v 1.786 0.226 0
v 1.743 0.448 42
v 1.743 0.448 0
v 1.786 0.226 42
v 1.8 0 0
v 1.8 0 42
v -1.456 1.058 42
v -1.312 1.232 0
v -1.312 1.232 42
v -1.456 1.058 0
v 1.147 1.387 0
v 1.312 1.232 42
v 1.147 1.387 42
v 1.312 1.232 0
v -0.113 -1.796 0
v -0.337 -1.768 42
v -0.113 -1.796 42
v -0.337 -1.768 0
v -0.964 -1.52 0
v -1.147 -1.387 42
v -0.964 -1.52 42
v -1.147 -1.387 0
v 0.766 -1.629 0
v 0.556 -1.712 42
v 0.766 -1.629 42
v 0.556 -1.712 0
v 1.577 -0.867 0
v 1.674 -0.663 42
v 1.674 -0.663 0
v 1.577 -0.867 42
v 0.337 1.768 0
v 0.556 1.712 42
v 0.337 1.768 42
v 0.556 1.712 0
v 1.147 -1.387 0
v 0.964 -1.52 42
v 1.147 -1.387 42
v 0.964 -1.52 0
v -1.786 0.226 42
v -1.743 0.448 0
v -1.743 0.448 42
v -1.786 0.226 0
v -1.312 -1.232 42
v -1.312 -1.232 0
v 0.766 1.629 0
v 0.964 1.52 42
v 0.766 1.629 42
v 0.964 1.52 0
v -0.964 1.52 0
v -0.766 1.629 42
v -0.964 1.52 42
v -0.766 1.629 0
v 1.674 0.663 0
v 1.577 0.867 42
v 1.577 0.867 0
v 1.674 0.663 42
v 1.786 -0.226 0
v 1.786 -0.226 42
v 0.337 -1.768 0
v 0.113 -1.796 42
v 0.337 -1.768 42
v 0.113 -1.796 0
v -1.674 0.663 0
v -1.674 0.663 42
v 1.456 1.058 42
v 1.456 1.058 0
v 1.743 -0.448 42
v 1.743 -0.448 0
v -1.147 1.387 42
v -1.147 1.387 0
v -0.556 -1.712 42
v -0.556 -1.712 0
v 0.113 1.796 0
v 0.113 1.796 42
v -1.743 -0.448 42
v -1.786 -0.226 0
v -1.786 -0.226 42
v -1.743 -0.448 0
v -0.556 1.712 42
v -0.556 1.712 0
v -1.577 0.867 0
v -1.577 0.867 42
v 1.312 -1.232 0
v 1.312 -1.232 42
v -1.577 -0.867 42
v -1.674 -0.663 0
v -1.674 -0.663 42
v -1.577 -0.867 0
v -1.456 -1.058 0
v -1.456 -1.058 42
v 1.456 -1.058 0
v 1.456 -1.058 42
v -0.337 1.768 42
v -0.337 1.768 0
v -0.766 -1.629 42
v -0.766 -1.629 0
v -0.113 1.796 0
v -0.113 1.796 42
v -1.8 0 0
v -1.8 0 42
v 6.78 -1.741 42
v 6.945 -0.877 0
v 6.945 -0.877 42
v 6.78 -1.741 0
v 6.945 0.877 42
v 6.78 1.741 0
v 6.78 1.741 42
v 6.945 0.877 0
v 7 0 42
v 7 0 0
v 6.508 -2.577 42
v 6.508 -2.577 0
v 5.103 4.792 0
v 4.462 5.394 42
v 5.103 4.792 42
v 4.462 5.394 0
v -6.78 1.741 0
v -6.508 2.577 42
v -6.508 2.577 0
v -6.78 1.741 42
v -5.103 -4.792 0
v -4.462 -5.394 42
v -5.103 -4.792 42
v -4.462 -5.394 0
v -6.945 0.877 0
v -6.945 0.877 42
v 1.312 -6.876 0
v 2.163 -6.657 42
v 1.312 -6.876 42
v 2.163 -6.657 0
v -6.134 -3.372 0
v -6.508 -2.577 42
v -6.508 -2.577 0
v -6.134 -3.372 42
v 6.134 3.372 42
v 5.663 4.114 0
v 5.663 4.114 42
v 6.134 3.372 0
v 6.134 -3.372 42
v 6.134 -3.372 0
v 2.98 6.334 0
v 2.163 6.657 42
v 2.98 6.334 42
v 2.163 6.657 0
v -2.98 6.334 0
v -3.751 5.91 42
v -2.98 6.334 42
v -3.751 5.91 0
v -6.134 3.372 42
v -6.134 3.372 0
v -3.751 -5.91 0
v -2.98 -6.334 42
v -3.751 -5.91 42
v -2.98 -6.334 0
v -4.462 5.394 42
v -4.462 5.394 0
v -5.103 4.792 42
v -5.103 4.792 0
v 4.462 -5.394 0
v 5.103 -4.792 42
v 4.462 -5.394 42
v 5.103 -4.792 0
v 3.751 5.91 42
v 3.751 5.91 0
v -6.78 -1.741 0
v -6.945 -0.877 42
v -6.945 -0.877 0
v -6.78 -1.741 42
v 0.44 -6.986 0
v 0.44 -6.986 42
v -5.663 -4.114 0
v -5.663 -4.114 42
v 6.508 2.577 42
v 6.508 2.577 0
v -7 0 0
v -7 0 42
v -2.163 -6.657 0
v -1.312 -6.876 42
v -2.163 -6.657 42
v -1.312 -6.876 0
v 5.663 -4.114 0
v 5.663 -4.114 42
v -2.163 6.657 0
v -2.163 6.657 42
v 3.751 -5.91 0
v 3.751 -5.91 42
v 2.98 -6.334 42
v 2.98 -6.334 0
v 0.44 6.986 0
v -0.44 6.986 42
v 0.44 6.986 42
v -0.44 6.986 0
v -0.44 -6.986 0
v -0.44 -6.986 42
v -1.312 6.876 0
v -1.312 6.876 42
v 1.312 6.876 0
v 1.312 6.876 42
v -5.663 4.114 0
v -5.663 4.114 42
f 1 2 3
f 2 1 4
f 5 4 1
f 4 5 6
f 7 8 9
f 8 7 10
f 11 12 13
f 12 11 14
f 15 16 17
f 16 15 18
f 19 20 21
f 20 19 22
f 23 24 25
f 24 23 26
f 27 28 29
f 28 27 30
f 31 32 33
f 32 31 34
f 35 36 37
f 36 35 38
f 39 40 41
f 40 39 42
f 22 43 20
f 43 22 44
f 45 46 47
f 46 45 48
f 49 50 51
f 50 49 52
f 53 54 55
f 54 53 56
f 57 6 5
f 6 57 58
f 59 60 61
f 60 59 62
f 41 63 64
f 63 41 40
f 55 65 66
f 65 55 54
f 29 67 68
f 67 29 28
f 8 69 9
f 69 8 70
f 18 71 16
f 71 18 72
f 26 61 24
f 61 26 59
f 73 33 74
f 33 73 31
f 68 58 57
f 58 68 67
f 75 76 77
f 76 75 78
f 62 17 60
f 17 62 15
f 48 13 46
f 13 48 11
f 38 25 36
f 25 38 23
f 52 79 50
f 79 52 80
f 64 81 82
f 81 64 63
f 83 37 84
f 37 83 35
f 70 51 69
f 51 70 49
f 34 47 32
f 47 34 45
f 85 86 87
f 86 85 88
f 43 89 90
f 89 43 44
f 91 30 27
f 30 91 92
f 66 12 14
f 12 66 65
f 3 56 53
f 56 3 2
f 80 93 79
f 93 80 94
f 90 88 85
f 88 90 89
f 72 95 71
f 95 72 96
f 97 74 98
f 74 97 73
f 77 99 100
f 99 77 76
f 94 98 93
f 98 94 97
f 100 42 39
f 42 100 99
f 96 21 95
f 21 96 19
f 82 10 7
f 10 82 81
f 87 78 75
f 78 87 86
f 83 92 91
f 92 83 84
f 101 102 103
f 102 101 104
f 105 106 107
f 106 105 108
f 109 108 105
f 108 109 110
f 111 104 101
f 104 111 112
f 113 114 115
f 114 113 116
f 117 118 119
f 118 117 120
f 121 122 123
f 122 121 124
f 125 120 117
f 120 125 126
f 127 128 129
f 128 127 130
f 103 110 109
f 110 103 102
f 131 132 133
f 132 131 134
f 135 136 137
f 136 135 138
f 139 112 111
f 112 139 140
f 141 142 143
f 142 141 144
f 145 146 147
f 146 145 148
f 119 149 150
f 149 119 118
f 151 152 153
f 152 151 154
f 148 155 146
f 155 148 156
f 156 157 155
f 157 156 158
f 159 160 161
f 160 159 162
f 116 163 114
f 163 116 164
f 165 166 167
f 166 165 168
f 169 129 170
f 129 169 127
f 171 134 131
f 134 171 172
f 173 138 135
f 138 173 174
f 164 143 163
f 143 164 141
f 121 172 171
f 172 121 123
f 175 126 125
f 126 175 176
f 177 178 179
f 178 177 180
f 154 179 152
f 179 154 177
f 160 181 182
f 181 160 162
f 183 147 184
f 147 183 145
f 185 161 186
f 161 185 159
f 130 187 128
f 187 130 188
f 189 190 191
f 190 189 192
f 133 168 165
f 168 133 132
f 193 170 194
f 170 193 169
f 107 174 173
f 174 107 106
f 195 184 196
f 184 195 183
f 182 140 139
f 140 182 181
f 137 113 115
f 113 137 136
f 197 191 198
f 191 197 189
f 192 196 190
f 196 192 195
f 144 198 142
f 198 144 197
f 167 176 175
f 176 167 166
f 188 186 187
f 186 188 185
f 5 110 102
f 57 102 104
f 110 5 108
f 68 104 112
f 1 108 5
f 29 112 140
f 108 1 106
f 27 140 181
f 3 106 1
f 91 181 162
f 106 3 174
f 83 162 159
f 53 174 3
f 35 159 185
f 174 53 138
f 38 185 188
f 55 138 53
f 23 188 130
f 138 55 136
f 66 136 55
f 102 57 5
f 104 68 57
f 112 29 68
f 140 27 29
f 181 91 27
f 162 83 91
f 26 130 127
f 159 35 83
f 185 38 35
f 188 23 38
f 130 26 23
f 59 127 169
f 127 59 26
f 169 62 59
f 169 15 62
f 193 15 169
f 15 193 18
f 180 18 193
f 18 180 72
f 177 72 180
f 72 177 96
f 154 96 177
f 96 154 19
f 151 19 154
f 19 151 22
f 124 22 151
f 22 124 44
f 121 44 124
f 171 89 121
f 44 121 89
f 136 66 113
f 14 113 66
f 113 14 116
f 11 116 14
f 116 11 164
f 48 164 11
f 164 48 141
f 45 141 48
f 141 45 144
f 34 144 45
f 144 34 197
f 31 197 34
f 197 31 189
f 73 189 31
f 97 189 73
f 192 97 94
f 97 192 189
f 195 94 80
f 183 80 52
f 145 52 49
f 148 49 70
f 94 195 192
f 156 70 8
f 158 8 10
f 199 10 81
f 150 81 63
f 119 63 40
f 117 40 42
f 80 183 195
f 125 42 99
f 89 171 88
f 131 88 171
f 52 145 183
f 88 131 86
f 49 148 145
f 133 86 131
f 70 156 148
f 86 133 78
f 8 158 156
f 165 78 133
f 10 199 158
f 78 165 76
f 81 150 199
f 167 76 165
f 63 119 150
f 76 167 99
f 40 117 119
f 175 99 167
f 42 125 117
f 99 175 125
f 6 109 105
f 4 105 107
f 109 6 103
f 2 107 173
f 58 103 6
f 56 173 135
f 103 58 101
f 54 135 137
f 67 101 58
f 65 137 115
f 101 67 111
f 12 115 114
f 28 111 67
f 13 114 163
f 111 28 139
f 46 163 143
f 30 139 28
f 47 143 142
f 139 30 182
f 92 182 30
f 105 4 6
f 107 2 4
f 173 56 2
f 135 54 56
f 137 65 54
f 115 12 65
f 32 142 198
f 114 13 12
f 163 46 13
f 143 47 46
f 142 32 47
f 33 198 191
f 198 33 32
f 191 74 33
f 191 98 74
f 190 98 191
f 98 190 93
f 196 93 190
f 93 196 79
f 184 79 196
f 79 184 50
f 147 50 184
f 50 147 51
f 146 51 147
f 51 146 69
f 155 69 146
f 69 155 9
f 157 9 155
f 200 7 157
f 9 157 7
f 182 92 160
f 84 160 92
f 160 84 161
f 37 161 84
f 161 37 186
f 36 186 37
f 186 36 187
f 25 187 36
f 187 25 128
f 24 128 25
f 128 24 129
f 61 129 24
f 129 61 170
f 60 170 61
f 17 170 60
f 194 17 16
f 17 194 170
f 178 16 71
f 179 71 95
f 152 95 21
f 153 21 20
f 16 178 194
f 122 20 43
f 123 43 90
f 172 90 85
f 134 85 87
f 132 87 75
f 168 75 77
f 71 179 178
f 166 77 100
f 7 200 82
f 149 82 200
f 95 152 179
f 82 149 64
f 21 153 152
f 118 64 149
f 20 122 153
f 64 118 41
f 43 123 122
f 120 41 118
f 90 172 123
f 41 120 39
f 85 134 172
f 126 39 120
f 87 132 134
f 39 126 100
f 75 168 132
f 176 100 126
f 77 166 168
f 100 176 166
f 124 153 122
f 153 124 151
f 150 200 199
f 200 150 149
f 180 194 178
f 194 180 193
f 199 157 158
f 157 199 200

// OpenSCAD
$fn = 50;


difference() {
	union() {
		cylinder(h = 42, r = 7.0000000000);
	}
	union() {
		translate(v = [0, 0, -100]) {
			cylinder(h = 200, r = 1.8000000000);
		}
		translate(v = [0, 0, -100]) {
			cylinder(h = 200, r = 1.8000000000);
		}
	}
}
